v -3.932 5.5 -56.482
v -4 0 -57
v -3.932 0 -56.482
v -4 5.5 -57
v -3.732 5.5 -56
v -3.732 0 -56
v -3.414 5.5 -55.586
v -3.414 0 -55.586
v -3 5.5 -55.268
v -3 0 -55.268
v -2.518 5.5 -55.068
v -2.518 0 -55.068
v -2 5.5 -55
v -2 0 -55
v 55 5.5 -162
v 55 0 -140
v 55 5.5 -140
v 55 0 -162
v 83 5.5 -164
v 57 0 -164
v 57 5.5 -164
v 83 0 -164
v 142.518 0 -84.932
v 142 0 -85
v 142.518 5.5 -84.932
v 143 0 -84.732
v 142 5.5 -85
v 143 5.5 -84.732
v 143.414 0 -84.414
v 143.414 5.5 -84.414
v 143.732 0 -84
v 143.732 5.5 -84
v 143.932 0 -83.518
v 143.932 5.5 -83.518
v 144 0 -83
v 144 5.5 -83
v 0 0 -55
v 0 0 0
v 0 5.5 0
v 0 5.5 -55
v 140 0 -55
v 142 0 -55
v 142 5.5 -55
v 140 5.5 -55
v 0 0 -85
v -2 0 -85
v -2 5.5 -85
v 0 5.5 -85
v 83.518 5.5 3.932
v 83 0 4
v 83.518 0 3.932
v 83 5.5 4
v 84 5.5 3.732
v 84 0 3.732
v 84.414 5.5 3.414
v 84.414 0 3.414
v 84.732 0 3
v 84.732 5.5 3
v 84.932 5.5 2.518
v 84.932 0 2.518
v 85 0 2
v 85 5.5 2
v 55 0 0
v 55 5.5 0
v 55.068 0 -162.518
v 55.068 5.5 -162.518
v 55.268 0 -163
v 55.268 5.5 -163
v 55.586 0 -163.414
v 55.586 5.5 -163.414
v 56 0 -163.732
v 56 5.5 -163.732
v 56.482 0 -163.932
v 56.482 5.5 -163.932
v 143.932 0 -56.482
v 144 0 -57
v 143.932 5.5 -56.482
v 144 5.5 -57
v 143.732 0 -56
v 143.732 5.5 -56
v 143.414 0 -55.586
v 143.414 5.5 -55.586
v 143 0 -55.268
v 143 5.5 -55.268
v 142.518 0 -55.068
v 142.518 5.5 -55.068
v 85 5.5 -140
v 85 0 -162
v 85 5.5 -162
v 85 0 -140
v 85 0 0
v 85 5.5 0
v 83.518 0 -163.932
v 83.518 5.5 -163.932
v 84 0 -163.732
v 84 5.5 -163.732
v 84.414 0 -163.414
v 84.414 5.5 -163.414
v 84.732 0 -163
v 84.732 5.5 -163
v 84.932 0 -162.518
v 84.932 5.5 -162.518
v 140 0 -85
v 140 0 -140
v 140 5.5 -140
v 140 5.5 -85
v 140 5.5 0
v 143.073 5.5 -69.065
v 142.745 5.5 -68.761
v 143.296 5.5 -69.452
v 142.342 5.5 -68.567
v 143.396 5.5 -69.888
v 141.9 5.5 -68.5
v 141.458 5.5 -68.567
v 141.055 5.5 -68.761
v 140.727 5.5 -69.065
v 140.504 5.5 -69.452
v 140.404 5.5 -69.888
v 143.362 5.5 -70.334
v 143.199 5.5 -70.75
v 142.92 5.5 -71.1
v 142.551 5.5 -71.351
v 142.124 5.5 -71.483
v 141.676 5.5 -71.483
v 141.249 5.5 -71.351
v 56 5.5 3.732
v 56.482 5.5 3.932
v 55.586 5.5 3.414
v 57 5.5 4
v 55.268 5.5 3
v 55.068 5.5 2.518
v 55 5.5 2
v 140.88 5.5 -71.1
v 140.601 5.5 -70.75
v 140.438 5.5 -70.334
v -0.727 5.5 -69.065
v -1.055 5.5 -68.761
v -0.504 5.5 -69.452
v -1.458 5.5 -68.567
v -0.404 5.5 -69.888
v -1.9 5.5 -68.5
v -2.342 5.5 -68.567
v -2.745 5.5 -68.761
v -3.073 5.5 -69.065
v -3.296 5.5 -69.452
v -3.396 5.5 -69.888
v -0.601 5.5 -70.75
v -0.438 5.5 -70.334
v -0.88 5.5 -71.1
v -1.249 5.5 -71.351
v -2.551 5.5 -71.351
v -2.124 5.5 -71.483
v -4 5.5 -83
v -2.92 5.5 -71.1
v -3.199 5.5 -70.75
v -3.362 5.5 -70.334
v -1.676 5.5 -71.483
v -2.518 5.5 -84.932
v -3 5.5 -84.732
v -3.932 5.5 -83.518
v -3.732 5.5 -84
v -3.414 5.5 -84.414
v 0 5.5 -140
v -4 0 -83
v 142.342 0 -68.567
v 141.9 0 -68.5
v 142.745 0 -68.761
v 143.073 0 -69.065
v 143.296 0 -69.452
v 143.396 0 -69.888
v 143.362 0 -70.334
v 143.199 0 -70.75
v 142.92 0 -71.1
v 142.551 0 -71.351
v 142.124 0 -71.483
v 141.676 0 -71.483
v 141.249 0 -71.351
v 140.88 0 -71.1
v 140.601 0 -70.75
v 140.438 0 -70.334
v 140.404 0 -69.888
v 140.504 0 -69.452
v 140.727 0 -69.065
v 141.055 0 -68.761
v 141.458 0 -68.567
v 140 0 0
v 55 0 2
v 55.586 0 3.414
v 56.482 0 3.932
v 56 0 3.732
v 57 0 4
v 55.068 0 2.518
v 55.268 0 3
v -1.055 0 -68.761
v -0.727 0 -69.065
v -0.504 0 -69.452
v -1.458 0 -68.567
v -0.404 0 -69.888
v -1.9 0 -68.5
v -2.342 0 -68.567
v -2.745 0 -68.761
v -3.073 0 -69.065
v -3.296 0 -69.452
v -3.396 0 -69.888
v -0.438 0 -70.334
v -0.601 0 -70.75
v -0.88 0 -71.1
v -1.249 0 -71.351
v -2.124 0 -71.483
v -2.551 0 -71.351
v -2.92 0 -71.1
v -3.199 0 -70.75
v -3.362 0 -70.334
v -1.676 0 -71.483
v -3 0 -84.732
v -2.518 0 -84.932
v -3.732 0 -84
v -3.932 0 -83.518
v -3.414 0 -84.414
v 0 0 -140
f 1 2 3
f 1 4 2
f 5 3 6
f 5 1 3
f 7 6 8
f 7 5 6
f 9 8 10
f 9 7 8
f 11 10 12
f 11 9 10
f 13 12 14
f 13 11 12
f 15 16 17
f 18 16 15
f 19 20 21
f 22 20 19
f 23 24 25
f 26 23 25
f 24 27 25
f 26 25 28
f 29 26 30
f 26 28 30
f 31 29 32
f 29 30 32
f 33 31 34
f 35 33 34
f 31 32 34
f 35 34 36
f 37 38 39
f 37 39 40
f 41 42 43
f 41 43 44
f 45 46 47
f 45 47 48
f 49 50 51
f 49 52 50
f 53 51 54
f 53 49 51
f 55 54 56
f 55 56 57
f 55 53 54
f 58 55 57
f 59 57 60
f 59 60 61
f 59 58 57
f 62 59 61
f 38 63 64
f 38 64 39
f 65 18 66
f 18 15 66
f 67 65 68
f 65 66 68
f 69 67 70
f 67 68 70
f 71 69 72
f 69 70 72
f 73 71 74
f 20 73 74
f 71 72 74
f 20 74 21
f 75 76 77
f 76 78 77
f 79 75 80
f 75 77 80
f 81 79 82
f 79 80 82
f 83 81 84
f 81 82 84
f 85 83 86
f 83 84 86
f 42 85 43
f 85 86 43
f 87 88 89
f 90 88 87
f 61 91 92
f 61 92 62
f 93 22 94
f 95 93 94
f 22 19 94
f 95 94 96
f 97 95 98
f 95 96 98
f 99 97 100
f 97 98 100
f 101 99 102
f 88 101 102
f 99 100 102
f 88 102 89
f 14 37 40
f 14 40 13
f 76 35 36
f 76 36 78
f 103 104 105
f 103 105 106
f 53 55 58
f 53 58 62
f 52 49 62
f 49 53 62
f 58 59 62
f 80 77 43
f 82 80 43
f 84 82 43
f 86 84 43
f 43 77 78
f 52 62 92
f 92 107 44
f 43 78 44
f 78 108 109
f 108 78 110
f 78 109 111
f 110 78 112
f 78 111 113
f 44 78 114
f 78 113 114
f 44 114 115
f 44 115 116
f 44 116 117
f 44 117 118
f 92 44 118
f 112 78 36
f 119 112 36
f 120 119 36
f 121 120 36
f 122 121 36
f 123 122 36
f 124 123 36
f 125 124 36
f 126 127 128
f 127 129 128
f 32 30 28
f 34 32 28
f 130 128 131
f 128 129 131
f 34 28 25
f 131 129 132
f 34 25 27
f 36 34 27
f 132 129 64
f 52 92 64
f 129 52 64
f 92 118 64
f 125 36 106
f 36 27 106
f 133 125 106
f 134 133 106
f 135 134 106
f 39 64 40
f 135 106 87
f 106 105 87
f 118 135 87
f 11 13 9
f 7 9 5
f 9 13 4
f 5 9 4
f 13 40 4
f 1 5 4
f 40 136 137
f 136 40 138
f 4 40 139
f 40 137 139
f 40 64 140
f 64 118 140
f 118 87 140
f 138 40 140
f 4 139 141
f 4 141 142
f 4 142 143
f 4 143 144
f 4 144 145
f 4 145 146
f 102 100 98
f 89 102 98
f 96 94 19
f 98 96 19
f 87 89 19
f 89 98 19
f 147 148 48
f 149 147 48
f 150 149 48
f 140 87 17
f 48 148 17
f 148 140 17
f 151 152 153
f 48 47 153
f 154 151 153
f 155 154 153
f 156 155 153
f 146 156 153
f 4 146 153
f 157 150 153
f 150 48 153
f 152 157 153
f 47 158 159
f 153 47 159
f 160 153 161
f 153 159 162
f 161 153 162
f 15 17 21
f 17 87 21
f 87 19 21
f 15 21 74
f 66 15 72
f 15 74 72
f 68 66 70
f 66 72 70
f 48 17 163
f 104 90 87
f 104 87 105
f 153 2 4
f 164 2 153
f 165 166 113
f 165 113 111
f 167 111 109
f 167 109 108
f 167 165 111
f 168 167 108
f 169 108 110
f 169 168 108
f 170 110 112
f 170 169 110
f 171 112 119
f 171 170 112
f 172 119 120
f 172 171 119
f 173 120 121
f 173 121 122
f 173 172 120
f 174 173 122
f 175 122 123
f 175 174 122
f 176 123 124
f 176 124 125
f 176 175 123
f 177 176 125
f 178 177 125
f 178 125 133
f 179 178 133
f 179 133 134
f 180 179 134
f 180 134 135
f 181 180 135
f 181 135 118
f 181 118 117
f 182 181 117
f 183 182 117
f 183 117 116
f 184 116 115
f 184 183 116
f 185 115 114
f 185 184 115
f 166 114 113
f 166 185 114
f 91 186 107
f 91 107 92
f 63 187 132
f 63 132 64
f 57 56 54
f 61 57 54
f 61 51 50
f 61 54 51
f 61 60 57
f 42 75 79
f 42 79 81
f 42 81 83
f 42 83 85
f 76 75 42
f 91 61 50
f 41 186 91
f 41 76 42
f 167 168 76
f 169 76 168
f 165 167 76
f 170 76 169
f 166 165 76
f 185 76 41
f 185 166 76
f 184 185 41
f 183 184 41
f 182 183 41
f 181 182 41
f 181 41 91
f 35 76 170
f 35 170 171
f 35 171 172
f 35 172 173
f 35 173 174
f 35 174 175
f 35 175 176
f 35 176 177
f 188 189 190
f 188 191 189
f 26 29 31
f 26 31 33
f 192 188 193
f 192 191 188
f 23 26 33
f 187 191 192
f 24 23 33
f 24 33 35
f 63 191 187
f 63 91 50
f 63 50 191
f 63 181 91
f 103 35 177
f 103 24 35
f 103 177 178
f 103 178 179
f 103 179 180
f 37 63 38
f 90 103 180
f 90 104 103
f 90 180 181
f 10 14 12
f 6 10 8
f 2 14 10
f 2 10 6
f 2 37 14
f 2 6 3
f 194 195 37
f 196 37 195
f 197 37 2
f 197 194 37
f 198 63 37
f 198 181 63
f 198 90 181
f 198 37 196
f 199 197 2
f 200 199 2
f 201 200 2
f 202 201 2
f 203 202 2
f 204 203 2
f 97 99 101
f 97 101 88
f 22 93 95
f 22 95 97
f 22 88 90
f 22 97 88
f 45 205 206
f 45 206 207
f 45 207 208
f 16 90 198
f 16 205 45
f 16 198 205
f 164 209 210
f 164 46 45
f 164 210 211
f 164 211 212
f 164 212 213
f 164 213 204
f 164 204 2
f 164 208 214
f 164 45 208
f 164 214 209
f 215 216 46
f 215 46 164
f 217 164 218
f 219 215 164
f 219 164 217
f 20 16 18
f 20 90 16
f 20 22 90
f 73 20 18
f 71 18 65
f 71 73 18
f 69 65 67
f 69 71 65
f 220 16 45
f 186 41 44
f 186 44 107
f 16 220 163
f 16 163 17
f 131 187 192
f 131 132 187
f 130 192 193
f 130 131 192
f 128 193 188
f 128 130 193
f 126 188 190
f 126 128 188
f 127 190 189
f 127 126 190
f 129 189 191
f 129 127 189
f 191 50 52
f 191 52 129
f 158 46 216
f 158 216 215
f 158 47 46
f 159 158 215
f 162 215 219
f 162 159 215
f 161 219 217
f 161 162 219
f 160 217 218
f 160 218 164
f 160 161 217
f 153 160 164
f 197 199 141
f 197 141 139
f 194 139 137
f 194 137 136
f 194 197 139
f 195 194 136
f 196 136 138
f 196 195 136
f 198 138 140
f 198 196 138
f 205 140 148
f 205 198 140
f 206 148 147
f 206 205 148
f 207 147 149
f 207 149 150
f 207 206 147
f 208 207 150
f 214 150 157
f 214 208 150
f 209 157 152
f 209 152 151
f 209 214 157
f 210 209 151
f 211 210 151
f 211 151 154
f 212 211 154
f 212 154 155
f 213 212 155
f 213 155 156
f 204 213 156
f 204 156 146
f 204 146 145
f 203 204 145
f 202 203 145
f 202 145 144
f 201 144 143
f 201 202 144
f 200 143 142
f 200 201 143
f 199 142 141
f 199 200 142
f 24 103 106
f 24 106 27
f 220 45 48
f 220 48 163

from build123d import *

# Parameters (mm, degrees)
SKETCH1_R           = 1.5
BOSS_EXTRUDE1_DEPTH = 5.5
FILLET1_R           = 2


with BuildPart() as part:
    # Sketch1 → Boss-Extrude1 (new body)
    with BuildSketch(Plane(origin=(0, 0, 0), x_dir=(1, 0, 0), z_dir=(0, 1, 0))):
        Polygon((0, 85), (0, 140), (55, 140), (55, 164), (85, 164), (85, 140), (140, 140), (140, 85), (144, 85), (144, 55), (140, 55), (140, 0), (85, 0), (85, -4), (55, -4), (55, 0), (0, 0), (0, 55), (-4, 55), (-4, 85), align=None)
        with Locations(Location((-1.9, 70, 0), (0, 0, 270))):
            Circle(SKETCH1_R, mode=Mode.SUBTRACT)
        with Locations(Location((141.9, 70, 0), (0, 0, 270))):
            Circle(SKETCH1_R, mode=Mode.SUBTRACT)
    extrude(amount=BOSS_EXTRUDE1_DEPTH)

    # Fillet1
    fillet1_edges = [part.edges().sort_by_distance(p)[0] for p in [
        (-4, 2.75, -55),
        (-4, 2.75, -85),
        (55, 2.75, -164),
        (85, 2.75, -164),
        (144, 2.75, -85),
        (144, 2.75, -55),
        (85, 2.75, 4),
        (55, 2.75, 4),
    ]]
    fillet(fillet1_edges, radius=FILLET1_R)


solid = part.part
